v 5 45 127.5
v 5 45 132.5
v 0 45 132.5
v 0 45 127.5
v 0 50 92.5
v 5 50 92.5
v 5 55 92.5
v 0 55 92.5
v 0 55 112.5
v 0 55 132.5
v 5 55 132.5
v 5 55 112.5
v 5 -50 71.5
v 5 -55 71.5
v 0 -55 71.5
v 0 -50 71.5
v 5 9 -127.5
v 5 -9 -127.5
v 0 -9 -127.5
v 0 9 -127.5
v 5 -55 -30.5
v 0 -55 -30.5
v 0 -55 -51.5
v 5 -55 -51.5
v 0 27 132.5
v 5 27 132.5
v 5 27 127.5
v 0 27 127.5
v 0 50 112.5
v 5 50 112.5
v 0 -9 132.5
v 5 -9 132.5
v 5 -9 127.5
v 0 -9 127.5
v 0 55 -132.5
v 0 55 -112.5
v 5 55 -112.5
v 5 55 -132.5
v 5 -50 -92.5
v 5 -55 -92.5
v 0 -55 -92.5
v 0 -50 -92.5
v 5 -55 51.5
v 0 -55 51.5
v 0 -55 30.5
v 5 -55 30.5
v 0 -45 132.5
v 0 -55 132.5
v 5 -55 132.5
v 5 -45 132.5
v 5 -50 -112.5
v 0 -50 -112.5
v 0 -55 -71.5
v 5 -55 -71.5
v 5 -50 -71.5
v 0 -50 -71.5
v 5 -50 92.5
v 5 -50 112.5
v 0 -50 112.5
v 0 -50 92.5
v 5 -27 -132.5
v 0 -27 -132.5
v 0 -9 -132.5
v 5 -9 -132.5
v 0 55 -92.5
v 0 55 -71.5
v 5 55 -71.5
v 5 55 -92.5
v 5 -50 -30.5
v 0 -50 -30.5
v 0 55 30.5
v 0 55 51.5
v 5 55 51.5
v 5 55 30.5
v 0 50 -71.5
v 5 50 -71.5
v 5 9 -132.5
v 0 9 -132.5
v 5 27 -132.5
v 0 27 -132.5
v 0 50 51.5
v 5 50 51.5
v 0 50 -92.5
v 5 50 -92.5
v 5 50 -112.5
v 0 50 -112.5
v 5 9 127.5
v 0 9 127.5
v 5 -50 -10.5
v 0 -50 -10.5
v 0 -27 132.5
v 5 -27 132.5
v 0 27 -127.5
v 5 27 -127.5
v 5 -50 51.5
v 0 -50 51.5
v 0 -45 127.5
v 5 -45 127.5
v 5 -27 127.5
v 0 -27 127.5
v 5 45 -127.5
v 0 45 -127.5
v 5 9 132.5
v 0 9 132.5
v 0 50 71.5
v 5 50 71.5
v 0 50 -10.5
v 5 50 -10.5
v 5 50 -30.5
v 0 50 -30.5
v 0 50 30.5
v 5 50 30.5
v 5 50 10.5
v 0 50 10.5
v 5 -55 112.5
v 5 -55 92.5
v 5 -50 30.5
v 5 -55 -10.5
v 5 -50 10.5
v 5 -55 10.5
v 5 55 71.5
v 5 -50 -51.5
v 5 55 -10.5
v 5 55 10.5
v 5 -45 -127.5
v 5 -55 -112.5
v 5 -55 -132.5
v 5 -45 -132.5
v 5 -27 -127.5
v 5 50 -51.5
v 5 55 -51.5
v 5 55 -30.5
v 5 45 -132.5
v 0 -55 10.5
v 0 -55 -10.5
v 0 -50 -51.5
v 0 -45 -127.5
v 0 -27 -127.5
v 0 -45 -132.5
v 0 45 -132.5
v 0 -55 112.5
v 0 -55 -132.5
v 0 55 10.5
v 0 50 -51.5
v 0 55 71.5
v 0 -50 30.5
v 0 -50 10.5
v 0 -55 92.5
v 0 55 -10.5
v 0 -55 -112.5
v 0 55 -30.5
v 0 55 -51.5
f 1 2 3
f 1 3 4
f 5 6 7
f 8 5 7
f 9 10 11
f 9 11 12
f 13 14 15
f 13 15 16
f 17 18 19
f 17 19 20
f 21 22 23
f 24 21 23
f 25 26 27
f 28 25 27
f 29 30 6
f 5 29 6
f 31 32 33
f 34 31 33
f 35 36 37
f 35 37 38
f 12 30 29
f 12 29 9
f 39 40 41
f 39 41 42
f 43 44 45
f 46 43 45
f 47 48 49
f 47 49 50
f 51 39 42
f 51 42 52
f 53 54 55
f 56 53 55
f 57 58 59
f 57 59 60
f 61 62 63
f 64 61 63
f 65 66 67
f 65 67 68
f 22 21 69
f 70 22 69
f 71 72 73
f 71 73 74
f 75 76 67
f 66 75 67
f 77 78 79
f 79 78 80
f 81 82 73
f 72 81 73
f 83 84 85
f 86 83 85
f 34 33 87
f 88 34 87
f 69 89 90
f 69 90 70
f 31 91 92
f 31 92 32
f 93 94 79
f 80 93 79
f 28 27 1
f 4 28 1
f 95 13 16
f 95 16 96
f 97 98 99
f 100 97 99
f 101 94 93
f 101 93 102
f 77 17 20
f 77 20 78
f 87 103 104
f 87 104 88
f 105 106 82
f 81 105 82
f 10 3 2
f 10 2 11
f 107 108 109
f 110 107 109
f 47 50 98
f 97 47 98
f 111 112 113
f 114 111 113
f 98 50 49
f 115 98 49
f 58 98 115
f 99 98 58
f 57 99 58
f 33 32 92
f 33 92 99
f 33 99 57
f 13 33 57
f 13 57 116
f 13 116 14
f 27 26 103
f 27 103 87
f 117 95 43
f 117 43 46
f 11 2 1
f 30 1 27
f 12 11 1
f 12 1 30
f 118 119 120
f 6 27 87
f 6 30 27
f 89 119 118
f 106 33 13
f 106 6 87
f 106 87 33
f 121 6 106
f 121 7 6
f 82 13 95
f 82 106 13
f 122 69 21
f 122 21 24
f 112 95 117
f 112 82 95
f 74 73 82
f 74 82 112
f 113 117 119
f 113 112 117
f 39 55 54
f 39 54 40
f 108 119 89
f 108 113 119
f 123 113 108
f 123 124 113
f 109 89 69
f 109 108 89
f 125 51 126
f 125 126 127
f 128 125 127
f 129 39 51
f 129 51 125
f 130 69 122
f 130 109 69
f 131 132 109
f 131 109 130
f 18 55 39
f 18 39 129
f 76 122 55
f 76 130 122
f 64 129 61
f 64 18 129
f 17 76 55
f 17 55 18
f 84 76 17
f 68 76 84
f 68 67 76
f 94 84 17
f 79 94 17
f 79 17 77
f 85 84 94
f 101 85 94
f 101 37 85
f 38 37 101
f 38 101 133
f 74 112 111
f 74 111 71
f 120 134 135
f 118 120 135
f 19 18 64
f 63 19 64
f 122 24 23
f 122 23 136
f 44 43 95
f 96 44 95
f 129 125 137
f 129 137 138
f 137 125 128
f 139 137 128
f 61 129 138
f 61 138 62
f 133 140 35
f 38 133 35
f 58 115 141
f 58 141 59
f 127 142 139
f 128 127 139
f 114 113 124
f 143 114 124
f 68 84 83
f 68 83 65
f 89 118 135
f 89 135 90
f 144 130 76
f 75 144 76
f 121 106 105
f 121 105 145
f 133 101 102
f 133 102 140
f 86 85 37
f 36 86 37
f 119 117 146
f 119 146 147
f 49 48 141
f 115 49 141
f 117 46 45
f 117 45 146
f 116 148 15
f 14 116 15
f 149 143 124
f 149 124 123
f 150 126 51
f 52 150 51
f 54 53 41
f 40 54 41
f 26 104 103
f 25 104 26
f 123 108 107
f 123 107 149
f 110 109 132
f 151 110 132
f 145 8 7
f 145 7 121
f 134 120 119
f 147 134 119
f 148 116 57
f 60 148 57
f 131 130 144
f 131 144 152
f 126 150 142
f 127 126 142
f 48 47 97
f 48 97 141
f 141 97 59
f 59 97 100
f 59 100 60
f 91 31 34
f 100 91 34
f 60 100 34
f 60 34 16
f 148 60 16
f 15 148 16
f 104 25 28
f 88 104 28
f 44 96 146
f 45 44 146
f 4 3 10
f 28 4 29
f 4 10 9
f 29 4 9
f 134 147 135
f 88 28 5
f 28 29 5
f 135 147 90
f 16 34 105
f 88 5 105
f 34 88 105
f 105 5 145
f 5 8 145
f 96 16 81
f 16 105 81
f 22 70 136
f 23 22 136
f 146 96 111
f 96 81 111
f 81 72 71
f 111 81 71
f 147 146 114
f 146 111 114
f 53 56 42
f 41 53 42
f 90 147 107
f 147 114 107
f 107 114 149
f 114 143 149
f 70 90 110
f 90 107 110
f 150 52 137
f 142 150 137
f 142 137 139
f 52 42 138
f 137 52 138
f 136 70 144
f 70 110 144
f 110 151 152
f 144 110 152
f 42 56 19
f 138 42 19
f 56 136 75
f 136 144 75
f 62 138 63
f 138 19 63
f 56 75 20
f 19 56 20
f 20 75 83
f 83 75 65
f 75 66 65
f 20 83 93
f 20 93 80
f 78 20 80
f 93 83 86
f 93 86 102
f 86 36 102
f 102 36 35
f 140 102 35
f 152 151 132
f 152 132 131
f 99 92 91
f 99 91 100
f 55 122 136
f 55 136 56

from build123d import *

# Parameters (mm, degrees)
SKETCH1_W           = 265
SKETCH1_H           = 110
BOSS_EXTRUDE1_DEPTH = 5
SKETCH2_W           = 5
SKETCH2_H           = 18
SKETCH2_W_2         = 20
SKETCH2_H_2         = 5
CUT_EXTRUDE1_DEPTH  = 5


with BuildPart() as part:
    # Sketch1 → Boss-Extrude1 (new body)
    with BuildSketch(Plane(origin=(0, 0, 0), x_dir=(0, 0, -1), z_dir=(1, 0, 0))):
        Rectangle(SKETCH1_W, SKETCH1_H)
    extrude(amount=BOSS_EXTRUDE1_DEPTH)

    # Sketch2 → Cut-Extrude1 (cut)
    with BuildSketch(Plane(origin=(5, 0, 0), x_dir=(0, 0, -1), z_dir=(1, 0, 0))):
        with Locations((-130, 36)):
            Rectangle(SKETCH2_W, SKETCH2_H)
        with Locations((-130, 0)):
            Rectangle(SKETCH2_W, SKETCH2_H)
        with Locations((-130, -36)):
            Rectangle(SKETCH2_W, SKETCH2_H)
        with Locations((130, -36)):
            Rectangle(SKETCH2_W, SKETCH2_H)
        with Locations((130, 0)):
            Rectangle(SKETCH2_W, SKETCH2_H)
        with Locations((130, 36)):
            Rectangle(SKETCH2_W, SKETCH2_H)
        with Locations((-61.5, 52.5)):
            Rectangle(SKETCH2_W_2, SKETCH2_H_2)
        with Locations((-102.5, 52.5)):
            Rectangle(SKETCH2_W_2, SKETCH2_H_2)
        with Locations((-20.5, 52.5)):
            Rectangle(SKETCH2_W_2, SKETCH2_H_2)
        with Locations((20.5, 52.5)):
            Rectangle(SKETCH2_W_2, SKETCH2_H_2)
        with Locations((61.5, 52.5)):
            Rectangle(SKETCH2_W_2, SKETCH2_H_2)
        with Locations((102.5, 52.5)):
            Rectangle(SKETCH2_W_2, SKETCH2_H_2)
        with Locations((102.5, -52.5)):
            Rectangle(SKETCH2_W_2, SKETCH2_H_2)
        with Locations((61.5, -52.5)):
            Rectangle(SKETCH2_W_2, SKETCH2_H_2)
        with Locations((20.5, -52.5)):
            Rectangle(SKETCH2_W_2, SKETCH2_H_2)
        with Locations((-20.5, -52.5)):
            Rectangle(SKETCH2_W_2, SKETCH2_H_2)
        with Locations((-61.5, -52.5)):
            Rectangle(SKETCH2_W_2, SKETCH2_H_2)
        with Locations((-102.5, -52.5)):
            Rectangle(SKETCH2_W_2, SKETCH2_H_2)
    extrude(amount=-CUT_EXTRUDE1_DEPTH, mode=Mode.SUBTRACT)


solid = part.part
